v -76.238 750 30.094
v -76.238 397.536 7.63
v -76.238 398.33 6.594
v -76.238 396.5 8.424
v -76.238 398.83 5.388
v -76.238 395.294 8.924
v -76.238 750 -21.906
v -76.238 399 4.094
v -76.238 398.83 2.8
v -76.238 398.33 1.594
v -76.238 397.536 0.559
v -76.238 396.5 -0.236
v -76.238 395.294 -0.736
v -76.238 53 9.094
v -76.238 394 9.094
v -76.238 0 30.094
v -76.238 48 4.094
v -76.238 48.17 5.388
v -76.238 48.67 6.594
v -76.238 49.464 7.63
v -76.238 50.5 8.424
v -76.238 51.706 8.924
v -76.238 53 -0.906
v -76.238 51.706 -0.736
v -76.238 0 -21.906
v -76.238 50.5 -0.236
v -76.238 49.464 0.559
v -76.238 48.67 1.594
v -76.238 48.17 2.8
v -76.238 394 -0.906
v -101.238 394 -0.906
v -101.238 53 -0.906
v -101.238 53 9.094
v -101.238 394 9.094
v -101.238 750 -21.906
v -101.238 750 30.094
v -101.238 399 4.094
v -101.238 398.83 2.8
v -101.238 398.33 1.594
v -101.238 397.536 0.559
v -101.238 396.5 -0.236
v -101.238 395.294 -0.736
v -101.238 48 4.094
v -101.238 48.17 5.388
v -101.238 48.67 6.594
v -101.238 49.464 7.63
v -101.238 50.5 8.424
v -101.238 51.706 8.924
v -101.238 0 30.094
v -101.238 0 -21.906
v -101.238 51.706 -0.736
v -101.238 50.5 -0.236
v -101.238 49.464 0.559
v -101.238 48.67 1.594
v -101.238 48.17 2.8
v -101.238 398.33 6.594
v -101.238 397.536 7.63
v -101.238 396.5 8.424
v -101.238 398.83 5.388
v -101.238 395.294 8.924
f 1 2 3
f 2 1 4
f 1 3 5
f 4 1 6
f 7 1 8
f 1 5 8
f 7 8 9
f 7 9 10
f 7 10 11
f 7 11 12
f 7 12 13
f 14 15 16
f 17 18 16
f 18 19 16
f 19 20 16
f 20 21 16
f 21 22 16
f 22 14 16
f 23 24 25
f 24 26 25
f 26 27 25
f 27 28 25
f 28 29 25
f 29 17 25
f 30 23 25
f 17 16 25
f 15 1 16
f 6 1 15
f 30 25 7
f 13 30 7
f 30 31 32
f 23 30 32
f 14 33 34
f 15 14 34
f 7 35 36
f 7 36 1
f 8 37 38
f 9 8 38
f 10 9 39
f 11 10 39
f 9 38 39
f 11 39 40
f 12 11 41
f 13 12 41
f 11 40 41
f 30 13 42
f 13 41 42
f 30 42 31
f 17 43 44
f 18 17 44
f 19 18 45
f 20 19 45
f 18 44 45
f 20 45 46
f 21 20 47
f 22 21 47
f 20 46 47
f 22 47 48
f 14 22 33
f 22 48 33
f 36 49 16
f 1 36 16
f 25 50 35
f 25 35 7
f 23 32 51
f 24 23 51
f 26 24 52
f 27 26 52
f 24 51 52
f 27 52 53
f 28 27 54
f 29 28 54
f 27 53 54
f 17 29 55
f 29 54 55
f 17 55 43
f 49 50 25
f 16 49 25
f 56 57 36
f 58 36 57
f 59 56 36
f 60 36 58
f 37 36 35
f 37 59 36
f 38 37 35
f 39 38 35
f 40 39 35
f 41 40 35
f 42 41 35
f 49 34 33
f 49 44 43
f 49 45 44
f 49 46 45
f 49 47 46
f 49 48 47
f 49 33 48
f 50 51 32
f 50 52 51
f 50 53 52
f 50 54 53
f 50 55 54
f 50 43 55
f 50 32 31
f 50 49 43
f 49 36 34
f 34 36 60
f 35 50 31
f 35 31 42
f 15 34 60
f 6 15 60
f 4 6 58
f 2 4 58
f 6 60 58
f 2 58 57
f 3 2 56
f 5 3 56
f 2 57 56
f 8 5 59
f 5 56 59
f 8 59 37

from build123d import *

# Parameters (mm, degrees)
SKETCH1_W           = 25
SKETCH1_H           = 52
BOSS_EXTRUDE1_DEPTH = 750
CUT_EXTRUDE2_DEPTH  = 40


with BuildPart() as part:
    # Sketch1 → Boss-Extrude1 (new body)
    with BuildSketch(Plane(origin=(0, 0, 0), x_dir=(1, 0, 0), z_dir=(0, 1, 0))):
        with Locations((-88.737623762, -4.094059406)):
            Rectangle(SKETCH1_W, SKETCH1_H)
    extrude(amount=BOSS_EXTRUDE1_DEPTH)

    # Sketch3 → Cut-Extrude2 (cut)
    with BuildSketch(Plane.ZY.offset(101.237623762)):
        with BuildLine():
            ThreePointArc((4.094059406, 58), (0.5585255, 56.535533906), (-0.905940594, 53))
            ThreePointArc((-0.905940594, 53), (0.5585255, 49.464466094), (4.094059406, 48))
            Line((4.094059406, 48), (4.094059406, 53))
            Line((4.094059406, 53), (4.094059406, 58))
        make_face()
        with BuildLine():
            ThreePointArc((9.094059406, 53), (7.629593312, 56.535533906), (4.094059406, 58))
            Line((4.094059406, 58), (4.094059406, 53))
            Line((4.094059406, 53), (4.094059406, 48))
            ThreePointArc((4.094059406, 48), (7.629593312, 49.464466094), (9.094059406, 53))
        make_face()
        with BuildLine():
            ThreePointArc((4.094059406, 58), (0.5585255, 56.535533906), (-0.905940594, 53))
            ThreePointArc((-0.905940594, 53), (0.5585255, 49.464466094), (4.094059406, 48))
            Line((4.094059406, 48), (4.094059406, 53))
            Line((4.094059406, 53), (4.094059406, 58))
        make_face()
        with BuildLine():
            ThreePointArc((9.094059406, 53), (7.629593312, 56.535533906), (4.094059406, 58))
            Line((4.094059406, 58), (4.094059406, 53))
            Line((4.094059406, 53), (4.094059406, 48))
            ThreePointArc((4.094059406, 48), (7.629593312, 49.464466094), (9.094059406, 53))
        make_face()
        with BuildLine():
            ThreePointArc((9.094059406, 394), (7.629593312, 390.464466094), (4.094059406, 389))
            Line((4.094059406, 389), (4.094059406, 58))
            ThreePointArc((4.094059406, 58), (7.629593312, 56.535533906), (9.094059406, 53))
            Line((9.094059406, 53), (9.094059406, 394))
        make_face()
        with BuildLine():
            ThreePointArc((4.094059406, 389), (0.5585255, 390.464466094), (-0.905940594, 394))
            Line((-0.905940594, 394), (-0.905940594, 53))
            ThreePointArc((-0.905940594, 53), (0.5585255, 56.535533906), (4.094059406, 58))
            Line((4.094059406, 58), (4.094059406, 389))
        make_face()
        with BuildLine():
            ThreePointArc((4.094059406, 399), (0.5585255, 397.535533906), (-0.905940594, 394))
            ThreePointArc((-0.905940594, 394), (0.5585255, 390.464466094), (4.094059406, 389))
            Line((4.094059406, 389), (4.094059406, 394))
            Line((4.094059406, 394), (4.094059406, 399))
        make_face()
        with BuildLine():
            ThreePointArc((9.094059406, 394), (7.629593312, 397.535533906), (4.094059406, 399))
            Line((4.094059406, 399), (4.094059406, 394))
            Line((4.094059406, 394), (4.094059406, 389))
            ThreePointArc((4.094059406, 389), (7.629593312, 390.464466094), (9.094059406, 394))
        make_face()
        with BuildLine():
            ThreePointArc((4.094059406, 399), (0.5585255, 397.535533906), (-0.905940594, 394))
            ThreePointArc((-0.905940594, 394), (0.5585255, 390.464466094), (4.094059406, 389))
            Line((4.094059406, 389), (4.094059406, 394))
            Line((4.094059406, 394), (4.094059406, 399))
        make_face()
        with BuildLine():
            ThreePointArc((9.094059406, 394), (7.629593312, 397.535533906), (4.094059406, 399))
            Line((4.094059406, 399), (4.094059406, 394))
            Line((4.094059406, 394), (4.094059406, 389))
            ThreePointArc((4.094059406, 389), (7.629593312, 390.464466094), (9.094059406, 394))
        make_face()
    extrude(amount=-CUT_EXTRUDE2_DEPTH, mode=Mode.SUBTRACT)


solid = part.part
